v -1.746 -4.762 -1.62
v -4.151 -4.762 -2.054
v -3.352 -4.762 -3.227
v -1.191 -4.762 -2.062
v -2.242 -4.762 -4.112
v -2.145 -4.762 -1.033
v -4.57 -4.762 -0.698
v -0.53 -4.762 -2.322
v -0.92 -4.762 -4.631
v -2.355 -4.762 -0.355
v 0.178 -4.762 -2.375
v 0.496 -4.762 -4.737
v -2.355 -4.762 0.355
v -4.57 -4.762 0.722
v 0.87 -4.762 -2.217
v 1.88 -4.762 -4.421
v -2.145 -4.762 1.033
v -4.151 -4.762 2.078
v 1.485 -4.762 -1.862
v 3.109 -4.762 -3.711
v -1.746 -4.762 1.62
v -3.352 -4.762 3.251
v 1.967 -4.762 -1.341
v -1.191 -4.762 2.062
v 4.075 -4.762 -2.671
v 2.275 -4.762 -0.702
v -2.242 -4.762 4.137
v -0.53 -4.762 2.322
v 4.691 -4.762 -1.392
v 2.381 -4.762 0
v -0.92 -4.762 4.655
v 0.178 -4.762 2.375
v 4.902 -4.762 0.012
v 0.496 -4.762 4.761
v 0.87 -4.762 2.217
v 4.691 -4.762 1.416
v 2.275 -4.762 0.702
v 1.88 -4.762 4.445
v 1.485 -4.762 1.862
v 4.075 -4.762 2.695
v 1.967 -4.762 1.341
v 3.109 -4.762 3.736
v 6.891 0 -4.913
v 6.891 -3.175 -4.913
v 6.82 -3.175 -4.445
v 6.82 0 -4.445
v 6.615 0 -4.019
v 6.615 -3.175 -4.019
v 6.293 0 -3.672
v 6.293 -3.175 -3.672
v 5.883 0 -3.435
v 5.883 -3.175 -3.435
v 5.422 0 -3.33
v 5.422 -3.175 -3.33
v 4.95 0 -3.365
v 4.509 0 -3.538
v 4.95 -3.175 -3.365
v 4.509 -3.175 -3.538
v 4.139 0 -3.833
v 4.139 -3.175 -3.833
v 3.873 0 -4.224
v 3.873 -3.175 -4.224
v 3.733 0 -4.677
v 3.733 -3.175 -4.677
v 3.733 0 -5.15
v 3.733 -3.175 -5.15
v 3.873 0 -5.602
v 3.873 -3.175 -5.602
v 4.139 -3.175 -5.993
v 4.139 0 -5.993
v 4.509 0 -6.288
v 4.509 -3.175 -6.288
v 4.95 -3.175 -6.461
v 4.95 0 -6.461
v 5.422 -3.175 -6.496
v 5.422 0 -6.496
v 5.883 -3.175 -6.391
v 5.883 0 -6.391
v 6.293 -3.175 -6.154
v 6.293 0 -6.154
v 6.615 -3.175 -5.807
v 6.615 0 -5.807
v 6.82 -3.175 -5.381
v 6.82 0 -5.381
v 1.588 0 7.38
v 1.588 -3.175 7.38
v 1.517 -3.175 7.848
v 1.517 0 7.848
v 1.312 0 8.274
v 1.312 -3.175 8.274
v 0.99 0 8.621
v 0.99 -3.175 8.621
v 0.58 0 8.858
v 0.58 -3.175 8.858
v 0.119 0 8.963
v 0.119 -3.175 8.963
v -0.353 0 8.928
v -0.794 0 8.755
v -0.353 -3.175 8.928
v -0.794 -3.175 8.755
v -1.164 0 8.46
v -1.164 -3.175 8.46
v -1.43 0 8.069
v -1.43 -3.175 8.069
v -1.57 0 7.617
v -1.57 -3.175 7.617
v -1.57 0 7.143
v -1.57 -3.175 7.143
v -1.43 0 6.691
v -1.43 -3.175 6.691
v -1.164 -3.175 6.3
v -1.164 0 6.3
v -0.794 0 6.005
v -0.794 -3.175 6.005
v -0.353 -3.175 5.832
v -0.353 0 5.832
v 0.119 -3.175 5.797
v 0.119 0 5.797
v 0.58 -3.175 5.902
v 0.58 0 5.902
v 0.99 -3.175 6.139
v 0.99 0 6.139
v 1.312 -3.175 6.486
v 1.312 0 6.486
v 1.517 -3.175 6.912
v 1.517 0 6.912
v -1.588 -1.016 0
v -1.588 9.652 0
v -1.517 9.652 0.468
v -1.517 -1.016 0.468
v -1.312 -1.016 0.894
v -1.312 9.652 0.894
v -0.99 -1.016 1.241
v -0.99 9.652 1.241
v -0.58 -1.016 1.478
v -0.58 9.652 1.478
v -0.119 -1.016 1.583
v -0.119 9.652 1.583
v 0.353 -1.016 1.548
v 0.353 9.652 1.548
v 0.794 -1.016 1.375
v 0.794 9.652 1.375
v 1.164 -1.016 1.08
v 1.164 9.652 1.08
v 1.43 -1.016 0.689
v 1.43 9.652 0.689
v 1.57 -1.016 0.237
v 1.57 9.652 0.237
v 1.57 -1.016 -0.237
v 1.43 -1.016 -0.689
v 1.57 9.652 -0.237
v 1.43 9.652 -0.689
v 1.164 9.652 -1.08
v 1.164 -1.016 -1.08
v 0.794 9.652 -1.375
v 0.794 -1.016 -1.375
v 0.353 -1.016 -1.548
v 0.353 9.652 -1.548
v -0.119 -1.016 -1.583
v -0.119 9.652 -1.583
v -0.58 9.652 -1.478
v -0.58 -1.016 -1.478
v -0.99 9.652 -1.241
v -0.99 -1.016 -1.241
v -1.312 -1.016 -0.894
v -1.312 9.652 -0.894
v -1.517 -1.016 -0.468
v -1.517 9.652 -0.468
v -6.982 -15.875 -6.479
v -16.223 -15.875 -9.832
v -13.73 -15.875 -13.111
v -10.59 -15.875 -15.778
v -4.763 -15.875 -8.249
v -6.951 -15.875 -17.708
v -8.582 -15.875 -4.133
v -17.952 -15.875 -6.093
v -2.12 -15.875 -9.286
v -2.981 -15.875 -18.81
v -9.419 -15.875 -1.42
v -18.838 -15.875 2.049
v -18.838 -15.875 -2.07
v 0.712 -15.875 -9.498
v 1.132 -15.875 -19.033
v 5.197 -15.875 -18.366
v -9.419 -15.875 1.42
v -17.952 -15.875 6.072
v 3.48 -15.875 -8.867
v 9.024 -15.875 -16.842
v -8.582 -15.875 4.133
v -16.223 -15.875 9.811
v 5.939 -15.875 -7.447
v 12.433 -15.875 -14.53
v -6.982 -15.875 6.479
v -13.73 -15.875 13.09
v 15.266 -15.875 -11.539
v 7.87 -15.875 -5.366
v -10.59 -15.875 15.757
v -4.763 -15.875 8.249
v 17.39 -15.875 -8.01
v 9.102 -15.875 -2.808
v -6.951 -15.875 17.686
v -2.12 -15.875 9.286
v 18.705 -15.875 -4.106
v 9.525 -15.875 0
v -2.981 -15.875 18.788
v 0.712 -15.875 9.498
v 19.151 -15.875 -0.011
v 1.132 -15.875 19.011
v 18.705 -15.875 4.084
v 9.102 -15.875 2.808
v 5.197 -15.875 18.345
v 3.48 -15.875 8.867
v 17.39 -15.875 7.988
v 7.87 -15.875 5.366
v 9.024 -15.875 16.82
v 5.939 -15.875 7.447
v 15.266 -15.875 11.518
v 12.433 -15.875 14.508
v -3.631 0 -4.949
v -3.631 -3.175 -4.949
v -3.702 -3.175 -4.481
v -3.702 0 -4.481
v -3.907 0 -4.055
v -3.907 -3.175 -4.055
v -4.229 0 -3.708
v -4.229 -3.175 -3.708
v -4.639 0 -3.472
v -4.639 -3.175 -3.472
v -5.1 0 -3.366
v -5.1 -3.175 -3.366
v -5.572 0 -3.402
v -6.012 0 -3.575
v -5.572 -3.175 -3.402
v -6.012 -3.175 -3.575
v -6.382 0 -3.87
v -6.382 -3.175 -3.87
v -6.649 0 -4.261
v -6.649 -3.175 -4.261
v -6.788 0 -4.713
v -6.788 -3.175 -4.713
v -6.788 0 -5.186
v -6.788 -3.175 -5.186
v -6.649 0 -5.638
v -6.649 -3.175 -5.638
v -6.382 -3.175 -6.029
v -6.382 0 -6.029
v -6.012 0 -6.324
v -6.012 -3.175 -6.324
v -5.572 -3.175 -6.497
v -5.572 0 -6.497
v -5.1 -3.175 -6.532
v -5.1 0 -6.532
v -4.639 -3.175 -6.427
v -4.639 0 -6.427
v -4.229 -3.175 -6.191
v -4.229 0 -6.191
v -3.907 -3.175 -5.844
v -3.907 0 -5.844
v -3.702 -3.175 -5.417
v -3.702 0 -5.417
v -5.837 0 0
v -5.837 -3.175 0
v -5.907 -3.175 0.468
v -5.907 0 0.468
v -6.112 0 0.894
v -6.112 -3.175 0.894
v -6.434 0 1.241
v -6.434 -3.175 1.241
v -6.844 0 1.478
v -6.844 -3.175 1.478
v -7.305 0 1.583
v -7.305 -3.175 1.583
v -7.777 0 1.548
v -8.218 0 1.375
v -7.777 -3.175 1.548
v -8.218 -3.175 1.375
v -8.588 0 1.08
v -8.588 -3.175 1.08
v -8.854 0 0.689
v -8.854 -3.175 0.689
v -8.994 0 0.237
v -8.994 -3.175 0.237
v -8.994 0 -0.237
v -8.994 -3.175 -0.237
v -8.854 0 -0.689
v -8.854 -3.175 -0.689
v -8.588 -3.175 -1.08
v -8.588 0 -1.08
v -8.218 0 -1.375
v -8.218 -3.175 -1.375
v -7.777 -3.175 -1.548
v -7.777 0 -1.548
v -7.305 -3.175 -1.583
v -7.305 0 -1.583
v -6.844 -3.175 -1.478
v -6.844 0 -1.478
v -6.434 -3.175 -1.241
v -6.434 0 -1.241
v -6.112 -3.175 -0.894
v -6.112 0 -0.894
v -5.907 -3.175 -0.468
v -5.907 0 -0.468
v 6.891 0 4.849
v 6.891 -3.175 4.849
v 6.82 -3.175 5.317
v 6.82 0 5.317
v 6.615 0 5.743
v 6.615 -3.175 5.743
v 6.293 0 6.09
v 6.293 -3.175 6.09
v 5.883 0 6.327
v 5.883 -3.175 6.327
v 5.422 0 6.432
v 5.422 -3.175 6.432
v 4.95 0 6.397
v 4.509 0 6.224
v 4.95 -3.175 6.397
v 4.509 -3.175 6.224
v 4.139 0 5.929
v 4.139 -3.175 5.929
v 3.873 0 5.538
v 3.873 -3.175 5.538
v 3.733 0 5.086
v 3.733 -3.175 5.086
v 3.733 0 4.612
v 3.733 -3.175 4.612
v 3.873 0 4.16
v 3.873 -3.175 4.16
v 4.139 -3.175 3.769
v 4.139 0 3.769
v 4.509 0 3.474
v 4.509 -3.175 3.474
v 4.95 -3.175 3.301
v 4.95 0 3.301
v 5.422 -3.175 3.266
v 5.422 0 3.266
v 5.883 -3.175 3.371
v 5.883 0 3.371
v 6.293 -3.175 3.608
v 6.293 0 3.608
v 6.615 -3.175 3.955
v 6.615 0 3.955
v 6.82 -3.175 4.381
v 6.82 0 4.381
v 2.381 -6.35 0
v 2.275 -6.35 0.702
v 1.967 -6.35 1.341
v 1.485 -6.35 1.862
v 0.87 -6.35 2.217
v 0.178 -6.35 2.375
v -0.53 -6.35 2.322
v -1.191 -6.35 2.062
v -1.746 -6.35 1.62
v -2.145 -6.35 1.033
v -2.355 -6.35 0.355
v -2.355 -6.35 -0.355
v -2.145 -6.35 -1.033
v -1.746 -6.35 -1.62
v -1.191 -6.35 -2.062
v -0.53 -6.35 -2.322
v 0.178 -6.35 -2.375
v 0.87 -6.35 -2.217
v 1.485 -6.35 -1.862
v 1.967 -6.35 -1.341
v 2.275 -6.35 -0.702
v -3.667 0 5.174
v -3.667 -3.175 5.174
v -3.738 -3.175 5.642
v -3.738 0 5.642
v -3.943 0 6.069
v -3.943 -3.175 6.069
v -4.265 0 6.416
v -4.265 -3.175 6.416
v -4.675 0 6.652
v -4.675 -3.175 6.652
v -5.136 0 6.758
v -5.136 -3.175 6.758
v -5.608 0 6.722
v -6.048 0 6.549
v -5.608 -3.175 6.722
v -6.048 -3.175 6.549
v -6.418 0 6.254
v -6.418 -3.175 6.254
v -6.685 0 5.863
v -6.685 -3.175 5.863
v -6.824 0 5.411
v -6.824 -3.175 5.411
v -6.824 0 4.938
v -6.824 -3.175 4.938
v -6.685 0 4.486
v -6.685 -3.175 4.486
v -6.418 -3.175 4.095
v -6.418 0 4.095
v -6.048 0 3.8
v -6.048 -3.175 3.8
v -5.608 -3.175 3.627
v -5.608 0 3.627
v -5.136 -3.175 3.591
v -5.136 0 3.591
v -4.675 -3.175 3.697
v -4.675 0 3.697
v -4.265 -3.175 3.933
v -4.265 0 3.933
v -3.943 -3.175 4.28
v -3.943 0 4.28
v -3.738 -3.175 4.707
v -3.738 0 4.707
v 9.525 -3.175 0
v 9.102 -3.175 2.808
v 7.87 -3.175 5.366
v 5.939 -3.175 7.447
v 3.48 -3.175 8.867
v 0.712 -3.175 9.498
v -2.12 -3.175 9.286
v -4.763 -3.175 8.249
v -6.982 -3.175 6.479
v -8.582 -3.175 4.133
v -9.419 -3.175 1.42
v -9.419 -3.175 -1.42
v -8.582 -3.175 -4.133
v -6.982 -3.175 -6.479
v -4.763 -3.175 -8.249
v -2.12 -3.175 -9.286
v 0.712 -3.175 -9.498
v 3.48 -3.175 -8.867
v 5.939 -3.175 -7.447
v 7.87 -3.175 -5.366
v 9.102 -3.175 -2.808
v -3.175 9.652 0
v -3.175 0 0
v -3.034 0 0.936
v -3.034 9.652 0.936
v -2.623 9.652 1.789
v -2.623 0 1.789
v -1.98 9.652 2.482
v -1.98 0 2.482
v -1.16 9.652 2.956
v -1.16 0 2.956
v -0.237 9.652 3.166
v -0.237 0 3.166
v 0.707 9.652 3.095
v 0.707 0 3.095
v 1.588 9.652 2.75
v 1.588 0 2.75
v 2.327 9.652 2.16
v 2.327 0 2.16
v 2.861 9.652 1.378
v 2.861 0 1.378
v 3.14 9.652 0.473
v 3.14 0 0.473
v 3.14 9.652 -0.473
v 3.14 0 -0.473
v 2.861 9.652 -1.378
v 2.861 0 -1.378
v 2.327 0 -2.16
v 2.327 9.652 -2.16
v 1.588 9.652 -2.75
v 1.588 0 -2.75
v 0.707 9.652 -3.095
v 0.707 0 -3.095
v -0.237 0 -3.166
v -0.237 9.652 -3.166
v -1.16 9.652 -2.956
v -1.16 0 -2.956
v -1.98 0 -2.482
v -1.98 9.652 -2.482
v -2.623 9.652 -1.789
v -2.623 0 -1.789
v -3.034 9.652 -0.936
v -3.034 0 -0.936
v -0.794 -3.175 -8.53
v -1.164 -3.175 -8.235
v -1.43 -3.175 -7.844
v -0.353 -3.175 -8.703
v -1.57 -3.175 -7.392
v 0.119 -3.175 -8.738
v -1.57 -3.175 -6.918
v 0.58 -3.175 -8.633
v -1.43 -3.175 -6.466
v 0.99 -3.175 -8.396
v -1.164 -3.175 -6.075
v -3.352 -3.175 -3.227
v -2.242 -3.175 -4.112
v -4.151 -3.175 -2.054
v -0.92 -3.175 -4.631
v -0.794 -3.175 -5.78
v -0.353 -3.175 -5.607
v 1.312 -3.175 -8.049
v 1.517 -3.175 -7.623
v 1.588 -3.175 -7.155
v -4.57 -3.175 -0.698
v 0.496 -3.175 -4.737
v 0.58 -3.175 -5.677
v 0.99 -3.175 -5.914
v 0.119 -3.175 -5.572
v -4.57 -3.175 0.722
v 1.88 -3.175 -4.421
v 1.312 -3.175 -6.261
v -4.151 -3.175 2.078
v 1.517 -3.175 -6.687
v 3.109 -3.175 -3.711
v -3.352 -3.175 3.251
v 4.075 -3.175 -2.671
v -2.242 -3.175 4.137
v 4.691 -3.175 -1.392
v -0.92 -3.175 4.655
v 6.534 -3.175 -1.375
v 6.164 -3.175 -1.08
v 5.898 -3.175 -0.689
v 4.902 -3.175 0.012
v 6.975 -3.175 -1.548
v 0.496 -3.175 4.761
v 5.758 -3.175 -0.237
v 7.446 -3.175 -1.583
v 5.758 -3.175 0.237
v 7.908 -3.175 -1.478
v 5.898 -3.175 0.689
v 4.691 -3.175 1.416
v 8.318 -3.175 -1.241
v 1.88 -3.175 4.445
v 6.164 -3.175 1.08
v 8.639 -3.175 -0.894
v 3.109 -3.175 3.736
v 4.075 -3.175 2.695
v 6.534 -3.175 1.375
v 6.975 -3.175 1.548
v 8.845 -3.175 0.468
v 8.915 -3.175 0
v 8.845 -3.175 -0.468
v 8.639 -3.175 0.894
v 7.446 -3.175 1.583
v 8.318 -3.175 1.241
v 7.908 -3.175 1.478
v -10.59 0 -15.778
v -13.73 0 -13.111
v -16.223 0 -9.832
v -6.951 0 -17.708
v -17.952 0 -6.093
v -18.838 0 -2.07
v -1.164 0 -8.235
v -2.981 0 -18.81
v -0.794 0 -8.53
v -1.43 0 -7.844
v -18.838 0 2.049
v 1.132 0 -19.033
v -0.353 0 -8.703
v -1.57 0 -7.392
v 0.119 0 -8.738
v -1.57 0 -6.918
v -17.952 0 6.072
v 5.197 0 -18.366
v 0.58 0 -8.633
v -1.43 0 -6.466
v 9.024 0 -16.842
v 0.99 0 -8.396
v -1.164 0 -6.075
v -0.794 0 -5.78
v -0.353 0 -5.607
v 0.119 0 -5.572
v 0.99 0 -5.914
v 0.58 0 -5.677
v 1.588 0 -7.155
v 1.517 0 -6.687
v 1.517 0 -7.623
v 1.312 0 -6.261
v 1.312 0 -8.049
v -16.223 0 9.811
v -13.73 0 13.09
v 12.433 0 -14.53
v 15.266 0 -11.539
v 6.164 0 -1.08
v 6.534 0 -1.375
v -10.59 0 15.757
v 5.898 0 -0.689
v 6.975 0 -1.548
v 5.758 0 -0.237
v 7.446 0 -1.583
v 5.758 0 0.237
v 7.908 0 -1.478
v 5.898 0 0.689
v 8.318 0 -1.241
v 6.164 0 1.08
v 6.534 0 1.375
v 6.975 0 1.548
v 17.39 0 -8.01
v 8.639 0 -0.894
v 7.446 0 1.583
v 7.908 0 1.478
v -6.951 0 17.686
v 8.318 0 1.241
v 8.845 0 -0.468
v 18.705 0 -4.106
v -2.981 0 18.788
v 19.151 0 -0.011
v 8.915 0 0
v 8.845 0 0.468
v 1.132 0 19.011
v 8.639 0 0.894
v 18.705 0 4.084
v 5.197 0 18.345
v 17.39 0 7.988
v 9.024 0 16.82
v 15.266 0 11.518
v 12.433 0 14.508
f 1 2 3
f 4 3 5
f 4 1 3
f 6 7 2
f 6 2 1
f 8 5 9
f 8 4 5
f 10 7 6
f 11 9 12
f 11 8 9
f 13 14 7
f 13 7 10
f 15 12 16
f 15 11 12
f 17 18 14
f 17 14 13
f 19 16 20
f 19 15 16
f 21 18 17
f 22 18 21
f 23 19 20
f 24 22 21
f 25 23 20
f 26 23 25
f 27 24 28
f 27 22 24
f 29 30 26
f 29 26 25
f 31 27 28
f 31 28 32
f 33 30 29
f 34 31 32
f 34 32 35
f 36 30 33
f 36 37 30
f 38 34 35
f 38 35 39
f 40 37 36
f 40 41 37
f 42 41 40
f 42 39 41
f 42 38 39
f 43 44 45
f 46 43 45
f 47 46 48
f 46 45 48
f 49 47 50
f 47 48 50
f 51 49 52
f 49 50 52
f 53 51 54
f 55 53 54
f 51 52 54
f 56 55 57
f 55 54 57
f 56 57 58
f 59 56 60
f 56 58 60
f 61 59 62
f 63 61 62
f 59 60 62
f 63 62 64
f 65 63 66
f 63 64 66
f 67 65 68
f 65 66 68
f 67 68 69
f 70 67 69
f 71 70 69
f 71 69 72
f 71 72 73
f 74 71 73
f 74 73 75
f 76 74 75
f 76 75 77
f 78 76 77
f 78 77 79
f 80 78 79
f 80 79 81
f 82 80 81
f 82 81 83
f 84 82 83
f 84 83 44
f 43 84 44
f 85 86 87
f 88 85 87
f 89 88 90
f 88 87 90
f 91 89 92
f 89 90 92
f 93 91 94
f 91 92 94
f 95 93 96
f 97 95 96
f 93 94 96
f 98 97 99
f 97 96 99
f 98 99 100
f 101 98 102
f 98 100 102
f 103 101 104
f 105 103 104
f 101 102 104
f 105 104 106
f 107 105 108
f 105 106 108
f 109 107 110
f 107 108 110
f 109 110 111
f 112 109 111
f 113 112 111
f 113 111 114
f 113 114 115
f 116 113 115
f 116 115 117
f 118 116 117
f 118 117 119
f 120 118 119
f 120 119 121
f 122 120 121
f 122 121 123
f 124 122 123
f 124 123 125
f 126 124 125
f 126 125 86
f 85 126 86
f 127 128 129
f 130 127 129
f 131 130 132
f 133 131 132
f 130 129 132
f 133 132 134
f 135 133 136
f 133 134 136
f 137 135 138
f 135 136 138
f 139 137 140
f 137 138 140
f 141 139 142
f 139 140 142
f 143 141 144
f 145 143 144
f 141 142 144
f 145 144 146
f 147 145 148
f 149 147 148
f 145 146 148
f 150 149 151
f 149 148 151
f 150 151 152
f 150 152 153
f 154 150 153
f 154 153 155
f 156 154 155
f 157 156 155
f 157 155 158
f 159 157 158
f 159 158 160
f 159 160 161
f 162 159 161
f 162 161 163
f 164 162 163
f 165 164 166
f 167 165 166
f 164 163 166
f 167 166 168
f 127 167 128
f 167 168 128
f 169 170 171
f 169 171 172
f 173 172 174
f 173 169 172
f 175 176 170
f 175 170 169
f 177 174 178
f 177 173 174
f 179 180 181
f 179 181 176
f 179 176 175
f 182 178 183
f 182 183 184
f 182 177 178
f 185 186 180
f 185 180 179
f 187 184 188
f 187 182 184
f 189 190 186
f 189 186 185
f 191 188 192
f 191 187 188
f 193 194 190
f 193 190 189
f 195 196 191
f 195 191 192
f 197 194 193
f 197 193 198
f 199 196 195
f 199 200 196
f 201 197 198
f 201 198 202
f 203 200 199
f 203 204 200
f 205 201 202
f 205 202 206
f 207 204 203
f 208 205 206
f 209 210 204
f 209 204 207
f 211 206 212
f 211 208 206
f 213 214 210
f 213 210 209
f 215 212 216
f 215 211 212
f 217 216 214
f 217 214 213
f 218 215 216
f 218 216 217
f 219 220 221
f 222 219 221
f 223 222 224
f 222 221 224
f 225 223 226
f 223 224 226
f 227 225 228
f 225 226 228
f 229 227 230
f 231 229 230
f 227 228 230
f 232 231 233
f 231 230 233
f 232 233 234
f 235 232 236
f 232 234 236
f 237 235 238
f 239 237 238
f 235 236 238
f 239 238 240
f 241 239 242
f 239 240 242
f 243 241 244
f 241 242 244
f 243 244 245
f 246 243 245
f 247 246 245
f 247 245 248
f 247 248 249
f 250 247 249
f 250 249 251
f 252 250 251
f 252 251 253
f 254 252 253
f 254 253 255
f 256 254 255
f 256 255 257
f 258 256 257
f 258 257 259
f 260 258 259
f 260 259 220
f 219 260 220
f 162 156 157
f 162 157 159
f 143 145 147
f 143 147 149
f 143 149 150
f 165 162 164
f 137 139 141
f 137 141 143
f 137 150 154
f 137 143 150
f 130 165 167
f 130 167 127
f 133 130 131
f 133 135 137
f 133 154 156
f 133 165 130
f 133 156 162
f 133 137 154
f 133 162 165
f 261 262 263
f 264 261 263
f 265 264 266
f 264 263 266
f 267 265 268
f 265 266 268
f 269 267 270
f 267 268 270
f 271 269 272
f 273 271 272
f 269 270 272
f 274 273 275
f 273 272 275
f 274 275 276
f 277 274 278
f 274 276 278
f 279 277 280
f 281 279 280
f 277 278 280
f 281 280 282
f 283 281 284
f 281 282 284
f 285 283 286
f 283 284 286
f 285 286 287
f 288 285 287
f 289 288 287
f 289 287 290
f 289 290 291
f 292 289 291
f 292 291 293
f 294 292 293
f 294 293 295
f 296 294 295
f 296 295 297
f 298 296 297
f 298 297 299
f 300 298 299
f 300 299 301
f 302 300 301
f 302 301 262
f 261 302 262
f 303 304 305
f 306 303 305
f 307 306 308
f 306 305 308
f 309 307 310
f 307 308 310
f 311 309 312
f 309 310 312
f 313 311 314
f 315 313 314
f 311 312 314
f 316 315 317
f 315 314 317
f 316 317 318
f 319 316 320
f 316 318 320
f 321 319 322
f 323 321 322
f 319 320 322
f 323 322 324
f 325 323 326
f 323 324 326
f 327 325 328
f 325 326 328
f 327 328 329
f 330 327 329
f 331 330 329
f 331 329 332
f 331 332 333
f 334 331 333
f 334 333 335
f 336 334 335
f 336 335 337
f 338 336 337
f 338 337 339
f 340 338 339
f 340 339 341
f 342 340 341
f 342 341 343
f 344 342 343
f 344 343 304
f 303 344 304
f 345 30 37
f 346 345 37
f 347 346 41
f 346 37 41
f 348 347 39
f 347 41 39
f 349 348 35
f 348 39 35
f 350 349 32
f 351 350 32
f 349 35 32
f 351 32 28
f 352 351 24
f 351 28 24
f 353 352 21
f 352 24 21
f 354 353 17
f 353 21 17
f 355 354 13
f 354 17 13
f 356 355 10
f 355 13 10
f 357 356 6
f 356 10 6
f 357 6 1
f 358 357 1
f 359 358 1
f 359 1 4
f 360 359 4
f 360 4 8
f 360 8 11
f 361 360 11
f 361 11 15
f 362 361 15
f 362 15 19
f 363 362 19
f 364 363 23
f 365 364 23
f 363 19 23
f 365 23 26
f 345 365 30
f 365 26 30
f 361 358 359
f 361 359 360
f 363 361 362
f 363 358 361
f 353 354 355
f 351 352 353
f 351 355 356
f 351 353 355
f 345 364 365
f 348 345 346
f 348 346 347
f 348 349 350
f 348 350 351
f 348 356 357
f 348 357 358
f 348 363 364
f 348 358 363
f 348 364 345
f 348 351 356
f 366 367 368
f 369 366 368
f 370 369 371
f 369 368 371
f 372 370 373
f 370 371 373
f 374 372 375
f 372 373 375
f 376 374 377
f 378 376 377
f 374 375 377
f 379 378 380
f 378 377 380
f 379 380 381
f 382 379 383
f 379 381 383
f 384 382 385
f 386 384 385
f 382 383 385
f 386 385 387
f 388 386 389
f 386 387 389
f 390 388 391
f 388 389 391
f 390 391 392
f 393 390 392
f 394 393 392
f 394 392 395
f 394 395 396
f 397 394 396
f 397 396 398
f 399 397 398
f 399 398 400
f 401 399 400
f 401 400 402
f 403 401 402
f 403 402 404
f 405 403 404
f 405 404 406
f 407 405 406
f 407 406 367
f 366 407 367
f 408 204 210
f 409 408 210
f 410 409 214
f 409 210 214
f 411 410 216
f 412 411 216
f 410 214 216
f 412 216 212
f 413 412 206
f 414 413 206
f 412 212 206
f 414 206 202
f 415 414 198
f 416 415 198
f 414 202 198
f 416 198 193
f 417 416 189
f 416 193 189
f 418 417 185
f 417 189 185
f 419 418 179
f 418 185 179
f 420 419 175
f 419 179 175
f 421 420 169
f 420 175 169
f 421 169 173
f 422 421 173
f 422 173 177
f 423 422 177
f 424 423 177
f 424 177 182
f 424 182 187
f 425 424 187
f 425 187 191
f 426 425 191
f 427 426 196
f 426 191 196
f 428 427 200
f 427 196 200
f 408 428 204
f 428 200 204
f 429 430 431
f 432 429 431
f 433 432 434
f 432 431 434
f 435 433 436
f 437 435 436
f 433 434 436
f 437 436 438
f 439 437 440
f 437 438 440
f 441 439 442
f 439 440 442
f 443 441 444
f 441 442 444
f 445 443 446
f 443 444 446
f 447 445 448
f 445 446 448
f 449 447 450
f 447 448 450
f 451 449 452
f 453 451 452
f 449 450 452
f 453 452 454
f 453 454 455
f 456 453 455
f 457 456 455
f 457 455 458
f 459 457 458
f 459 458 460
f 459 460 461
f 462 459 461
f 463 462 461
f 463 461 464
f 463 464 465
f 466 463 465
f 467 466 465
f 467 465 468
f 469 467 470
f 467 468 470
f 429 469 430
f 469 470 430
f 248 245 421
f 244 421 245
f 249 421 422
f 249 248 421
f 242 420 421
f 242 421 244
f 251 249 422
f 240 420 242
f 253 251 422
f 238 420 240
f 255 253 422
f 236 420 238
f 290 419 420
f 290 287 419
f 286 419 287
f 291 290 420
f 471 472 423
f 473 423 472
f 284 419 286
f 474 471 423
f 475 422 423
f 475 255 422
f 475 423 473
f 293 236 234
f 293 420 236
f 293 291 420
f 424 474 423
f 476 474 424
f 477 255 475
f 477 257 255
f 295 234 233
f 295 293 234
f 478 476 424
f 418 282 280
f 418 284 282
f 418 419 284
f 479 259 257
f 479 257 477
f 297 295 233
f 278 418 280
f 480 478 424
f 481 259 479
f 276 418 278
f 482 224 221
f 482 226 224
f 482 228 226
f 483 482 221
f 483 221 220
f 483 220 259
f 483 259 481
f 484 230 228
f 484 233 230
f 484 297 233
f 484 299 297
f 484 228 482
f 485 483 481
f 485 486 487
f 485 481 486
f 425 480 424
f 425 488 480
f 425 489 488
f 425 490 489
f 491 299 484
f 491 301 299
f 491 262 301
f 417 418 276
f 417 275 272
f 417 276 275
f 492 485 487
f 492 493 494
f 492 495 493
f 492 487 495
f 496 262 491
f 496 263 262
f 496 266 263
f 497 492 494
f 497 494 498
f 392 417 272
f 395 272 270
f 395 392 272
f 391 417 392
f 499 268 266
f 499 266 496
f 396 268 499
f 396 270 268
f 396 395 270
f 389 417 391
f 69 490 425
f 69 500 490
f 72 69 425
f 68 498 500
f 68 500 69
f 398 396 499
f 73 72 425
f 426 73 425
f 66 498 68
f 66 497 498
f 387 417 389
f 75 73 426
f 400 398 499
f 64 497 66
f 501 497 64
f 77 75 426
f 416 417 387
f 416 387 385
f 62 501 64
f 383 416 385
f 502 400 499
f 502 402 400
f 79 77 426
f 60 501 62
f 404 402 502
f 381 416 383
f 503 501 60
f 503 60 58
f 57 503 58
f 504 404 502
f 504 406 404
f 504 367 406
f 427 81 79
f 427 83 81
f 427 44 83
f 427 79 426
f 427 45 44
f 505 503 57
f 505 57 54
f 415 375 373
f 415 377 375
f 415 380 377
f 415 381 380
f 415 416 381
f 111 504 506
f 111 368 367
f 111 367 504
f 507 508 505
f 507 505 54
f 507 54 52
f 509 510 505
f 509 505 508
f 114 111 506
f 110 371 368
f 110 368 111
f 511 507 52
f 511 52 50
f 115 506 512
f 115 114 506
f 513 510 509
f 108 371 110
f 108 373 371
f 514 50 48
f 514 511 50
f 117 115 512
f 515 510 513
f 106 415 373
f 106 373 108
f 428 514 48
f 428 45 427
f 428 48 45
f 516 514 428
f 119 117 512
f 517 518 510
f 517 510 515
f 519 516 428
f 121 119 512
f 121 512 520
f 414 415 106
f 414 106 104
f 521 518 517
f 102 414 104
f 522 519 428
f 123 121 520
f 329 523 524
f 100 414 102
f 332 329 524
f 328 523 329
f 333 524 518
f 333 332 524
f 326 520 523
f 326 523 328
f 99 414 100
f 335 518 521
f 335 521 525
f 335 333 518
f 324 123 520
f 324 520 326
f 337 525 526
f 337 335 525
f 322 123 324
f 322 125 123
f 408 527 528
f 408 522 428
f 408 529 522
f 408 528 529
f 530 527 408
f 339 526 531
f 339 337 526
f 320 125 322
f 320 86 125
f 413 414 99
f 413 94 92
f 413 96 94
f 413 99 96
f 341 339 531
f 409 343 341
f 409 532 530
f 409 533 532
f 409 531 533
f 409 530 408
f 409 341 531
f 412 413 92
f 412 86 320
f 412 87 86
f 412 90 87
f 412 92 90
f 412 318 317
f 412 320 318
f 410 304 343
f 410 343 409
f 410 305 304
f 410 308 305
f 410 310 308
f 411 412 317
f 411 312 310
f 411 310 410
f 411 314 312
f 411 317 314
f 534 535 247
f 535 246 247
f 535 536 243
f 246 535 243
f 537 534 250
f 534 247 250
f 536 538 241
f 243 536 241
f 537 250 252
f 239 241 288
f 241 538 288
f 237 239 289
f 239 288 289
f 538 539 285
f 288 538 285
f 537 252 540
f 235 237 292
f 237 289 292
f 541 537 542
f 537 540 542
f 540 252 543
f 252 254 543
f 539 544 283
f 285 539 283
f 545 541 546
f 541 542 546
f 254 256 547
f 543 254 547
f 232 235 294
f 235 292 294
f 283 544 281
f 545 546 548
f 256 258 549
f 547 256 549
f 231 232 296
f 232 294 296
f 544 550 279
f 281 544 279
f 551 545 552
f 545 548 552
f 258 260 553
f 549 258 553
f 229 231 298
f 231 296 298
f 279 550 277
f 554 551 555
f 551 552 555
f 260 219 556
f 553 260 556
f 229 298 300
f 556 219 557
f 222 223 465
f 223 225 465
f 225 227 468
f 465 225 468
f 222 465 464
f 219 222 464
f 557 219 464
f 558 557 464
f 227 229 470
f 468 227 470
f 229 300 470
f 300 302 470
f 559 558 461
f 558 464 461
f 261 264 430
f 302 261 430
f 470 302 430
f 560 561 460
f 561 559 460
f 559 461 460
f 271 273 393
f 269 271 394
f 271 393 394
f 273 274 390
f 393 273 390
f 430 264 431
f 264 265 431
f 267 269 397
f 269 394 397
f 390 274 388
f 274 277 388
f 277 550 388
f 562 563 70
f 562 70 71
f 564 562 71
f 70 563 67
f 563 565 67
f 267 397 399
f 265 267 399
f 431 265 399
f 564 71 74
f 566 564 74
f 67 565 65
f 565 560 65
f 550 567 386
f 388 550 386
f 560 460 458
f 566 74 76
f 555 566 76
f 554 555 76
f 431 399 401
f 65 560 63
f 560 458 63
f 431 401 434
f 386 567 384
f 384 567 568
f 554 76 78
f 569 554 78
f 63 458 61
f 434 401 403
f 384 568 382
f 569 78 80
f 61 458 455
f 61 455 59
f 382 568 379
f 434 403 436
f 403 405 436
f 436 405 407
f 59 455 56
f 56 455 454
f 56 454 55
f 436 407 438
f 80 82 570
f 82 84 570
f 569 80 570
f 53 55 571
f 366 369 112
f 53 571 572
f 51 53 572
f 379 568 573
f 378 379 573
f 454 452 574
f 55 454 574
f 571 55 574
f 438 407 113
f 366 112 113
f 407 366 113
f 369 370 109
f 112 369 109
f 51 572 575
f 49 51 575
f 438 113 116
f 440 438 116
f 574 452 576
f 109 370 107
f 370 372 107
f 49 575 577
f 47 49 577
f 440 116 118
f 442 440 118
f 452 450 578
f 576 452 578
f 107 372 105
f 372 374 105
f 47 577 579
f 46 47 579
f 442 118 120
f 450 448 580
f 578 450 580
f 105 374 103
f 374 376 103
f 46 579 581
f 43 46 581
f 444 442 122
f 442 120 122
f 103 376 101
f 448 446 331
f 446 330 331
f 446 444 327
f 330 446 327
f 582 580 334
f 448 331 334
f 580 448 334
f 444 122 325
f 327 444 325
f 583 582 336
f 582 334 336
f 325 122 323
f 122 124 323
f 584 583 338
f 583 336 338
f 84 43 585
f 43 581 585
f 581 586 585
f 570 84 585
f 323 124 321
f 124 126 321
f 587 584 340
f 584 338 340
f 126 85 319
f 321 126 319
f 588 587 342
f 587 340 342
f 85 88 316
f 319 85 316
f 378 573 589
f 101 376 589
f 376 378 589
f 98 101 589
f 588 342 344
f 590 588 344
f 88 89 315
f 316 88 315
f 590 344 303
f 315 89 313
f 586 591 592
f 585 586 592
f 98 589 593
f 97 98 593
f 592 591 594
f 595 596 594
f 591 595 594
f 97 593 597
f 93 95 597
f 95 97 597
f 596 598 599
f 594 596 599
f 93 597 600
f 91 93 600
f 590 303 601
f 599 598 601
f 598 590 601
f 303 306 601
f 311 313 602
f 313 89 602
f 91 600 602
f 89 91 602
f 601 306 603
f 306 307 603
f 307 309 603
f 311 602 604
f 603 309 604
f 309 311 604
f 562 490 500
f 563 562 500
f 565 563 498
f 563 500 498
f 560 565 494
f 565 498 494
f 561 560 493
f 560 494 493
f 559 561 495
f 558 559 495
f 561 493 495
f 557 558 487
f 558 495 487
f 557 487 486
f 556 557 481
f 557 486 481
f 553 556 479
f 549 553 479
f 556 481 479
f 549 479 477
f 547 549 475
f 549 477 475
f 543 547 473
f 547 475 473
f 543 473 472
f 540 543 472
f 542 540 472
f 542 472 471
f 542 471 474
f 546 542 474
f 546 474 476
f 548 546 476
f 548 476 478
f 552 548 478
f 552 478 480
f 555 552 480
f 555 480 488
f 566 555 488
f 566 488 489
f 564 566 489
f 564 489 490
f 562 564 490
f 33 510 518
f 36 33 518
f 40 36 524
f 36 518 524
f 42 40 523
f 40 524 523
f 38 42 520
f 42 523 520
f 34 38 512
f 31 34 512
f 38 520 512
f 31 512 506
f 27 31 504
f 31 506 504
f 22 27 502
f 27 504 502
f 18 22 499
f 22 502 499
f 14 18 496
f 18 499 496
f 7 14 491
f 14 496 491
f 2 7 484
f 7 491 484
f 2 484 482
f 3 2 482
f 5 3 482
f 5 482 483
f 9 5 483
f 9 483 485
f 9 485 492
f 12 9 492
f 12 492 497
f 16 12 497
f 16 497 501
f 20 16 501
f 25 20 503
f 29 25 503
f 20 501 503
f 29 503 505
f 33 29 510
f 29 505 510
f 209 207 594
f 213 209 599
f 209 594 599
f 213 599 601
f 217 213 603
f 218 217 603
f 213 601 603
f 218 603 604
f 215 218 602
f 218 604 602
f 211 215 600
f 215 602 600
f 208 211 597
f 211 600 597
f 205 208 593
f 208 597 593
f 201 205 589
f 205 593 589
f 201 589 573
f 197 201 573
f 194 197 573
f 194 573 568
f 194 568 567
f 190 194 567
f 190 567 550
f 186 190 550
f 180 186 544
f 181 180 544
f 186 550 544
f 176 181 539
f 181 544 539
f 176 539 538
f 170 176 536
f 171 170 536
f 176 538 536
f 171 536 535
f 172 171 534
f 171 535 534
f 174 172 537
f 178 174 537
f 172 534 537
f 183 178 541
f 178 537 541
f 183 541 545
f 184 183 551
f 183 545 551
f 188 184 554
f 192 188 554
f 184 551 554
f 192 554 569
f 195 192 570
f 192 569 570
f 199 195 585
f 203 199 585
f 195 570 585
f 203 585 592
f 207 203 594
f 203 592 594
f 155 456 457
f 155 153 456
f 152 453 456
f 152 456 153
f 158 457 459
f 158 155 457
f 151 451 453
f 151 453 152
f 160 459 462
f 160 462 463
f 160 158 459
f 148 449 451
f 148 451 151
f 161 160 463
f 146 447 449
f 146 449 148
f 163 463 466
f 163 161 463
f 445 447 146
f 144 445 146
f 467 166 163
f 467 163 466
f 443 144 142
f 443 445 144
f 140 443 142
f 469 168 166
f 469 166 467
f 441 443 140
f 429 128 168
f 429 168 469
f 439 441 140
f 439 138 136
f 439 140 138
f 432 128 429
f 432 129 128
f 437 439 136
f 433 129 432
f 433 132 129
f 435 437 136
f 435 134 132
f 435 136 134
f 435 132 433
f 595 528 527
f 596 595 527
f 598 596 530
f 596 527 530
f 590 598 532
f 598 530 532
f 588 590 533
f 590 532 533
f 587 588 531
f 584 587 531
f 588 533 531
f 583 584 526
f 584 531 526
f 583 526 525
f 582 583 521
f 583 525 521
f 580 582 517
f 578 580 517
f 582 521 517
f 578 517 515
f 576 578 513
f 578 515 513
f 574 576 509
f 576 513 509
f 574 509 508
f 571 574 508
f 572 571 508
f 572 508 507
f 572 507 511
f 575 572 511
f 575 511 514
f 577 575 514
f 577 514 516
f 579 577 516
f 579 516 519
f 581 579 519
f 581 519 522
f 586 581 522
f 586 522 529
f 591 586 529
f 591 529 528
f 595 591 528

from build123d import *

# Parameters (mm, degrees)
F0_R      = 19.05
F1_DEPTH  = 15.875
F2_R      = 9.525
F3_DEPTH  = 12.7
F4_R      = 1.5875
F5_DEPTH  = 25.4
F6_R      = 1.5875
F7_DEPTH  = 25.4
F8_R      = 1.5875
F9_DEPTH  = 25.4
F10_R     = 1.5875
F11_DEPTH = 25.4
F12_R     = 1.5875
F13_DEPTH = 25.4
F14_R     = 1.5875
F15_DEPTH = 25.4
F16_R     = 1.5875
F17_DEPTH = 25.4
F18_R     = 1.5875
F19_DEPTH = 25.4
F20_R     = 4.7625
F21_DEPTH = 1.5875
F22_R     = 2.38125
F23_DEPTH = 1.5875
F24_R     = 3.175
F25_DEPTH = 9.652
F26_R     = 1.5875
F27_DEPTH = 10.668


# Not quite as in the source:
# - a length typed as a fraction of an inch, garbled in the dataset ("3 / 203.2 mm" for 3/8 in), is restored


with BuildPart() as f1:
    # F0 (on Front) → F1 (new body)
    with BuildSketch(Plane.XZ):
        with Locations((0.1005562392, -0.0107518102)):
            Circle(F0_R)
    extrude(amount=F1_DEPTH)

    # F2 (on face) → F3 (cut)
    with BuildSketch(Plane.XZ.offset(15.875)):
        Circle(F2_R)
    extrude(amount=-F3_DEPTH, mode=Mode.SUBTRACT)

    # F4 (on face) → F5 (cut)
    with BuildSketch(Plane.XZ.offset(3.175)):
        with Locations((0, 7.3800315149)):
            Circle(F4_R)
    extrude(amount=-F5_DEPTH, mode=Mode.SUBTRACT)

    # F6 (on face) → F7 (cut)
    with BuildSketch(Plane.XZ.offset(3.175)):
        with Locations((0, -7.154897321)):
            Circle(F6_R)
    extrude(amount=-F7_DEPTH, mode=Mode.SUBTRACT)

    # F8 (on face) → F9 (cut)
    with BuildSketch(Plane.XZ.offset(3.175)):
        with Locations((7.3278159834, 0)):
            Circle(F8_R)
    extrude(amount=-F9_DEPTH, mode=Mode.SUBTRACT)

    # F10 (on face) → F11 (cut)
    with BuildSketch(Plane.XZ.offset(3.175)):
        with Locations((-7.4240518734, 0)):
            Circle(F10_R)
    extrude(amount=-F11_DEPTH, mode=Mode.SUBTRACT)

    # F12 (on face) → F13 (cut)
    with BuildSketch(Plane.XZ.offset(3.175)):
        with Locations((-5.2546598017, 5.1744827069)):
            Circle(F12_R)
    extrude(amount=-F13_DEPTH, mode=Mode.SUBTRACT)

    # F14 (on face) → F15 (cut)
    with BuildSketch(Plane.XZ.offset(3.175)):
        with Locations((5.3030503914, 4.8490739428)):
            Circle(F14_R)
    extrude(amount=-F15_DEPTH, mode=Mode.SUBTRACT)

    # F16 (on face) → F17 (cut)
    with BuildSketch(Plane.XZ.offset(3.175)):
        with Locations((-5.2185030654, -4.949348513)):
            Circle(F16_R)
    extrude(amount=-F17_DEPTH, mode=Mode.SUBTRACT)

    # F18 (on face) → F19 (cut)
    with BuildSketch(Plane.XZ.offset(3.175)):
        with Locations((5.3030503914, -4.9131917767)):
            Circle(F18_R)
    extrude(amount=-F19_DEPTH, mode=Mode.SUBTRACT)

    # F20 (on face) → F21 (join)
    with BuildSketch(Plane.XZ.offset(3.175)):
        with Locations((0.1396279233, 0.0120795696)):
            Circle(F20_R)
    extrude(amount=F21_DEPTH)

    # F22 (on face) → F23 (join)
    with BuildSketch(Plane.XZ.offset(4.7625)):
        Circle(F22_R)
    extrude(amount=F23_DEPTH)

    # F24 (on face) → F25 (join)
    with BuildSketch(Plane(origin=(0, 0, 0), x_dir=(-1, 0, 0), z_dir=(0, 1, 0))):
        Circle(F24_R)
    extrude(amount=F25_DEPTH)

    # F26 (on face) → F27 (cut)
    with BuildSketch(Plane(origin=(0, 9.652, 0), x_dir=(-1, 0, 0), z_dir=(0, 1, 0))):
        Circle(F26_R)
    extrude(amount=-F27_DEPTH, mode=Mode.SUBTRACT)


solid = f1.part
